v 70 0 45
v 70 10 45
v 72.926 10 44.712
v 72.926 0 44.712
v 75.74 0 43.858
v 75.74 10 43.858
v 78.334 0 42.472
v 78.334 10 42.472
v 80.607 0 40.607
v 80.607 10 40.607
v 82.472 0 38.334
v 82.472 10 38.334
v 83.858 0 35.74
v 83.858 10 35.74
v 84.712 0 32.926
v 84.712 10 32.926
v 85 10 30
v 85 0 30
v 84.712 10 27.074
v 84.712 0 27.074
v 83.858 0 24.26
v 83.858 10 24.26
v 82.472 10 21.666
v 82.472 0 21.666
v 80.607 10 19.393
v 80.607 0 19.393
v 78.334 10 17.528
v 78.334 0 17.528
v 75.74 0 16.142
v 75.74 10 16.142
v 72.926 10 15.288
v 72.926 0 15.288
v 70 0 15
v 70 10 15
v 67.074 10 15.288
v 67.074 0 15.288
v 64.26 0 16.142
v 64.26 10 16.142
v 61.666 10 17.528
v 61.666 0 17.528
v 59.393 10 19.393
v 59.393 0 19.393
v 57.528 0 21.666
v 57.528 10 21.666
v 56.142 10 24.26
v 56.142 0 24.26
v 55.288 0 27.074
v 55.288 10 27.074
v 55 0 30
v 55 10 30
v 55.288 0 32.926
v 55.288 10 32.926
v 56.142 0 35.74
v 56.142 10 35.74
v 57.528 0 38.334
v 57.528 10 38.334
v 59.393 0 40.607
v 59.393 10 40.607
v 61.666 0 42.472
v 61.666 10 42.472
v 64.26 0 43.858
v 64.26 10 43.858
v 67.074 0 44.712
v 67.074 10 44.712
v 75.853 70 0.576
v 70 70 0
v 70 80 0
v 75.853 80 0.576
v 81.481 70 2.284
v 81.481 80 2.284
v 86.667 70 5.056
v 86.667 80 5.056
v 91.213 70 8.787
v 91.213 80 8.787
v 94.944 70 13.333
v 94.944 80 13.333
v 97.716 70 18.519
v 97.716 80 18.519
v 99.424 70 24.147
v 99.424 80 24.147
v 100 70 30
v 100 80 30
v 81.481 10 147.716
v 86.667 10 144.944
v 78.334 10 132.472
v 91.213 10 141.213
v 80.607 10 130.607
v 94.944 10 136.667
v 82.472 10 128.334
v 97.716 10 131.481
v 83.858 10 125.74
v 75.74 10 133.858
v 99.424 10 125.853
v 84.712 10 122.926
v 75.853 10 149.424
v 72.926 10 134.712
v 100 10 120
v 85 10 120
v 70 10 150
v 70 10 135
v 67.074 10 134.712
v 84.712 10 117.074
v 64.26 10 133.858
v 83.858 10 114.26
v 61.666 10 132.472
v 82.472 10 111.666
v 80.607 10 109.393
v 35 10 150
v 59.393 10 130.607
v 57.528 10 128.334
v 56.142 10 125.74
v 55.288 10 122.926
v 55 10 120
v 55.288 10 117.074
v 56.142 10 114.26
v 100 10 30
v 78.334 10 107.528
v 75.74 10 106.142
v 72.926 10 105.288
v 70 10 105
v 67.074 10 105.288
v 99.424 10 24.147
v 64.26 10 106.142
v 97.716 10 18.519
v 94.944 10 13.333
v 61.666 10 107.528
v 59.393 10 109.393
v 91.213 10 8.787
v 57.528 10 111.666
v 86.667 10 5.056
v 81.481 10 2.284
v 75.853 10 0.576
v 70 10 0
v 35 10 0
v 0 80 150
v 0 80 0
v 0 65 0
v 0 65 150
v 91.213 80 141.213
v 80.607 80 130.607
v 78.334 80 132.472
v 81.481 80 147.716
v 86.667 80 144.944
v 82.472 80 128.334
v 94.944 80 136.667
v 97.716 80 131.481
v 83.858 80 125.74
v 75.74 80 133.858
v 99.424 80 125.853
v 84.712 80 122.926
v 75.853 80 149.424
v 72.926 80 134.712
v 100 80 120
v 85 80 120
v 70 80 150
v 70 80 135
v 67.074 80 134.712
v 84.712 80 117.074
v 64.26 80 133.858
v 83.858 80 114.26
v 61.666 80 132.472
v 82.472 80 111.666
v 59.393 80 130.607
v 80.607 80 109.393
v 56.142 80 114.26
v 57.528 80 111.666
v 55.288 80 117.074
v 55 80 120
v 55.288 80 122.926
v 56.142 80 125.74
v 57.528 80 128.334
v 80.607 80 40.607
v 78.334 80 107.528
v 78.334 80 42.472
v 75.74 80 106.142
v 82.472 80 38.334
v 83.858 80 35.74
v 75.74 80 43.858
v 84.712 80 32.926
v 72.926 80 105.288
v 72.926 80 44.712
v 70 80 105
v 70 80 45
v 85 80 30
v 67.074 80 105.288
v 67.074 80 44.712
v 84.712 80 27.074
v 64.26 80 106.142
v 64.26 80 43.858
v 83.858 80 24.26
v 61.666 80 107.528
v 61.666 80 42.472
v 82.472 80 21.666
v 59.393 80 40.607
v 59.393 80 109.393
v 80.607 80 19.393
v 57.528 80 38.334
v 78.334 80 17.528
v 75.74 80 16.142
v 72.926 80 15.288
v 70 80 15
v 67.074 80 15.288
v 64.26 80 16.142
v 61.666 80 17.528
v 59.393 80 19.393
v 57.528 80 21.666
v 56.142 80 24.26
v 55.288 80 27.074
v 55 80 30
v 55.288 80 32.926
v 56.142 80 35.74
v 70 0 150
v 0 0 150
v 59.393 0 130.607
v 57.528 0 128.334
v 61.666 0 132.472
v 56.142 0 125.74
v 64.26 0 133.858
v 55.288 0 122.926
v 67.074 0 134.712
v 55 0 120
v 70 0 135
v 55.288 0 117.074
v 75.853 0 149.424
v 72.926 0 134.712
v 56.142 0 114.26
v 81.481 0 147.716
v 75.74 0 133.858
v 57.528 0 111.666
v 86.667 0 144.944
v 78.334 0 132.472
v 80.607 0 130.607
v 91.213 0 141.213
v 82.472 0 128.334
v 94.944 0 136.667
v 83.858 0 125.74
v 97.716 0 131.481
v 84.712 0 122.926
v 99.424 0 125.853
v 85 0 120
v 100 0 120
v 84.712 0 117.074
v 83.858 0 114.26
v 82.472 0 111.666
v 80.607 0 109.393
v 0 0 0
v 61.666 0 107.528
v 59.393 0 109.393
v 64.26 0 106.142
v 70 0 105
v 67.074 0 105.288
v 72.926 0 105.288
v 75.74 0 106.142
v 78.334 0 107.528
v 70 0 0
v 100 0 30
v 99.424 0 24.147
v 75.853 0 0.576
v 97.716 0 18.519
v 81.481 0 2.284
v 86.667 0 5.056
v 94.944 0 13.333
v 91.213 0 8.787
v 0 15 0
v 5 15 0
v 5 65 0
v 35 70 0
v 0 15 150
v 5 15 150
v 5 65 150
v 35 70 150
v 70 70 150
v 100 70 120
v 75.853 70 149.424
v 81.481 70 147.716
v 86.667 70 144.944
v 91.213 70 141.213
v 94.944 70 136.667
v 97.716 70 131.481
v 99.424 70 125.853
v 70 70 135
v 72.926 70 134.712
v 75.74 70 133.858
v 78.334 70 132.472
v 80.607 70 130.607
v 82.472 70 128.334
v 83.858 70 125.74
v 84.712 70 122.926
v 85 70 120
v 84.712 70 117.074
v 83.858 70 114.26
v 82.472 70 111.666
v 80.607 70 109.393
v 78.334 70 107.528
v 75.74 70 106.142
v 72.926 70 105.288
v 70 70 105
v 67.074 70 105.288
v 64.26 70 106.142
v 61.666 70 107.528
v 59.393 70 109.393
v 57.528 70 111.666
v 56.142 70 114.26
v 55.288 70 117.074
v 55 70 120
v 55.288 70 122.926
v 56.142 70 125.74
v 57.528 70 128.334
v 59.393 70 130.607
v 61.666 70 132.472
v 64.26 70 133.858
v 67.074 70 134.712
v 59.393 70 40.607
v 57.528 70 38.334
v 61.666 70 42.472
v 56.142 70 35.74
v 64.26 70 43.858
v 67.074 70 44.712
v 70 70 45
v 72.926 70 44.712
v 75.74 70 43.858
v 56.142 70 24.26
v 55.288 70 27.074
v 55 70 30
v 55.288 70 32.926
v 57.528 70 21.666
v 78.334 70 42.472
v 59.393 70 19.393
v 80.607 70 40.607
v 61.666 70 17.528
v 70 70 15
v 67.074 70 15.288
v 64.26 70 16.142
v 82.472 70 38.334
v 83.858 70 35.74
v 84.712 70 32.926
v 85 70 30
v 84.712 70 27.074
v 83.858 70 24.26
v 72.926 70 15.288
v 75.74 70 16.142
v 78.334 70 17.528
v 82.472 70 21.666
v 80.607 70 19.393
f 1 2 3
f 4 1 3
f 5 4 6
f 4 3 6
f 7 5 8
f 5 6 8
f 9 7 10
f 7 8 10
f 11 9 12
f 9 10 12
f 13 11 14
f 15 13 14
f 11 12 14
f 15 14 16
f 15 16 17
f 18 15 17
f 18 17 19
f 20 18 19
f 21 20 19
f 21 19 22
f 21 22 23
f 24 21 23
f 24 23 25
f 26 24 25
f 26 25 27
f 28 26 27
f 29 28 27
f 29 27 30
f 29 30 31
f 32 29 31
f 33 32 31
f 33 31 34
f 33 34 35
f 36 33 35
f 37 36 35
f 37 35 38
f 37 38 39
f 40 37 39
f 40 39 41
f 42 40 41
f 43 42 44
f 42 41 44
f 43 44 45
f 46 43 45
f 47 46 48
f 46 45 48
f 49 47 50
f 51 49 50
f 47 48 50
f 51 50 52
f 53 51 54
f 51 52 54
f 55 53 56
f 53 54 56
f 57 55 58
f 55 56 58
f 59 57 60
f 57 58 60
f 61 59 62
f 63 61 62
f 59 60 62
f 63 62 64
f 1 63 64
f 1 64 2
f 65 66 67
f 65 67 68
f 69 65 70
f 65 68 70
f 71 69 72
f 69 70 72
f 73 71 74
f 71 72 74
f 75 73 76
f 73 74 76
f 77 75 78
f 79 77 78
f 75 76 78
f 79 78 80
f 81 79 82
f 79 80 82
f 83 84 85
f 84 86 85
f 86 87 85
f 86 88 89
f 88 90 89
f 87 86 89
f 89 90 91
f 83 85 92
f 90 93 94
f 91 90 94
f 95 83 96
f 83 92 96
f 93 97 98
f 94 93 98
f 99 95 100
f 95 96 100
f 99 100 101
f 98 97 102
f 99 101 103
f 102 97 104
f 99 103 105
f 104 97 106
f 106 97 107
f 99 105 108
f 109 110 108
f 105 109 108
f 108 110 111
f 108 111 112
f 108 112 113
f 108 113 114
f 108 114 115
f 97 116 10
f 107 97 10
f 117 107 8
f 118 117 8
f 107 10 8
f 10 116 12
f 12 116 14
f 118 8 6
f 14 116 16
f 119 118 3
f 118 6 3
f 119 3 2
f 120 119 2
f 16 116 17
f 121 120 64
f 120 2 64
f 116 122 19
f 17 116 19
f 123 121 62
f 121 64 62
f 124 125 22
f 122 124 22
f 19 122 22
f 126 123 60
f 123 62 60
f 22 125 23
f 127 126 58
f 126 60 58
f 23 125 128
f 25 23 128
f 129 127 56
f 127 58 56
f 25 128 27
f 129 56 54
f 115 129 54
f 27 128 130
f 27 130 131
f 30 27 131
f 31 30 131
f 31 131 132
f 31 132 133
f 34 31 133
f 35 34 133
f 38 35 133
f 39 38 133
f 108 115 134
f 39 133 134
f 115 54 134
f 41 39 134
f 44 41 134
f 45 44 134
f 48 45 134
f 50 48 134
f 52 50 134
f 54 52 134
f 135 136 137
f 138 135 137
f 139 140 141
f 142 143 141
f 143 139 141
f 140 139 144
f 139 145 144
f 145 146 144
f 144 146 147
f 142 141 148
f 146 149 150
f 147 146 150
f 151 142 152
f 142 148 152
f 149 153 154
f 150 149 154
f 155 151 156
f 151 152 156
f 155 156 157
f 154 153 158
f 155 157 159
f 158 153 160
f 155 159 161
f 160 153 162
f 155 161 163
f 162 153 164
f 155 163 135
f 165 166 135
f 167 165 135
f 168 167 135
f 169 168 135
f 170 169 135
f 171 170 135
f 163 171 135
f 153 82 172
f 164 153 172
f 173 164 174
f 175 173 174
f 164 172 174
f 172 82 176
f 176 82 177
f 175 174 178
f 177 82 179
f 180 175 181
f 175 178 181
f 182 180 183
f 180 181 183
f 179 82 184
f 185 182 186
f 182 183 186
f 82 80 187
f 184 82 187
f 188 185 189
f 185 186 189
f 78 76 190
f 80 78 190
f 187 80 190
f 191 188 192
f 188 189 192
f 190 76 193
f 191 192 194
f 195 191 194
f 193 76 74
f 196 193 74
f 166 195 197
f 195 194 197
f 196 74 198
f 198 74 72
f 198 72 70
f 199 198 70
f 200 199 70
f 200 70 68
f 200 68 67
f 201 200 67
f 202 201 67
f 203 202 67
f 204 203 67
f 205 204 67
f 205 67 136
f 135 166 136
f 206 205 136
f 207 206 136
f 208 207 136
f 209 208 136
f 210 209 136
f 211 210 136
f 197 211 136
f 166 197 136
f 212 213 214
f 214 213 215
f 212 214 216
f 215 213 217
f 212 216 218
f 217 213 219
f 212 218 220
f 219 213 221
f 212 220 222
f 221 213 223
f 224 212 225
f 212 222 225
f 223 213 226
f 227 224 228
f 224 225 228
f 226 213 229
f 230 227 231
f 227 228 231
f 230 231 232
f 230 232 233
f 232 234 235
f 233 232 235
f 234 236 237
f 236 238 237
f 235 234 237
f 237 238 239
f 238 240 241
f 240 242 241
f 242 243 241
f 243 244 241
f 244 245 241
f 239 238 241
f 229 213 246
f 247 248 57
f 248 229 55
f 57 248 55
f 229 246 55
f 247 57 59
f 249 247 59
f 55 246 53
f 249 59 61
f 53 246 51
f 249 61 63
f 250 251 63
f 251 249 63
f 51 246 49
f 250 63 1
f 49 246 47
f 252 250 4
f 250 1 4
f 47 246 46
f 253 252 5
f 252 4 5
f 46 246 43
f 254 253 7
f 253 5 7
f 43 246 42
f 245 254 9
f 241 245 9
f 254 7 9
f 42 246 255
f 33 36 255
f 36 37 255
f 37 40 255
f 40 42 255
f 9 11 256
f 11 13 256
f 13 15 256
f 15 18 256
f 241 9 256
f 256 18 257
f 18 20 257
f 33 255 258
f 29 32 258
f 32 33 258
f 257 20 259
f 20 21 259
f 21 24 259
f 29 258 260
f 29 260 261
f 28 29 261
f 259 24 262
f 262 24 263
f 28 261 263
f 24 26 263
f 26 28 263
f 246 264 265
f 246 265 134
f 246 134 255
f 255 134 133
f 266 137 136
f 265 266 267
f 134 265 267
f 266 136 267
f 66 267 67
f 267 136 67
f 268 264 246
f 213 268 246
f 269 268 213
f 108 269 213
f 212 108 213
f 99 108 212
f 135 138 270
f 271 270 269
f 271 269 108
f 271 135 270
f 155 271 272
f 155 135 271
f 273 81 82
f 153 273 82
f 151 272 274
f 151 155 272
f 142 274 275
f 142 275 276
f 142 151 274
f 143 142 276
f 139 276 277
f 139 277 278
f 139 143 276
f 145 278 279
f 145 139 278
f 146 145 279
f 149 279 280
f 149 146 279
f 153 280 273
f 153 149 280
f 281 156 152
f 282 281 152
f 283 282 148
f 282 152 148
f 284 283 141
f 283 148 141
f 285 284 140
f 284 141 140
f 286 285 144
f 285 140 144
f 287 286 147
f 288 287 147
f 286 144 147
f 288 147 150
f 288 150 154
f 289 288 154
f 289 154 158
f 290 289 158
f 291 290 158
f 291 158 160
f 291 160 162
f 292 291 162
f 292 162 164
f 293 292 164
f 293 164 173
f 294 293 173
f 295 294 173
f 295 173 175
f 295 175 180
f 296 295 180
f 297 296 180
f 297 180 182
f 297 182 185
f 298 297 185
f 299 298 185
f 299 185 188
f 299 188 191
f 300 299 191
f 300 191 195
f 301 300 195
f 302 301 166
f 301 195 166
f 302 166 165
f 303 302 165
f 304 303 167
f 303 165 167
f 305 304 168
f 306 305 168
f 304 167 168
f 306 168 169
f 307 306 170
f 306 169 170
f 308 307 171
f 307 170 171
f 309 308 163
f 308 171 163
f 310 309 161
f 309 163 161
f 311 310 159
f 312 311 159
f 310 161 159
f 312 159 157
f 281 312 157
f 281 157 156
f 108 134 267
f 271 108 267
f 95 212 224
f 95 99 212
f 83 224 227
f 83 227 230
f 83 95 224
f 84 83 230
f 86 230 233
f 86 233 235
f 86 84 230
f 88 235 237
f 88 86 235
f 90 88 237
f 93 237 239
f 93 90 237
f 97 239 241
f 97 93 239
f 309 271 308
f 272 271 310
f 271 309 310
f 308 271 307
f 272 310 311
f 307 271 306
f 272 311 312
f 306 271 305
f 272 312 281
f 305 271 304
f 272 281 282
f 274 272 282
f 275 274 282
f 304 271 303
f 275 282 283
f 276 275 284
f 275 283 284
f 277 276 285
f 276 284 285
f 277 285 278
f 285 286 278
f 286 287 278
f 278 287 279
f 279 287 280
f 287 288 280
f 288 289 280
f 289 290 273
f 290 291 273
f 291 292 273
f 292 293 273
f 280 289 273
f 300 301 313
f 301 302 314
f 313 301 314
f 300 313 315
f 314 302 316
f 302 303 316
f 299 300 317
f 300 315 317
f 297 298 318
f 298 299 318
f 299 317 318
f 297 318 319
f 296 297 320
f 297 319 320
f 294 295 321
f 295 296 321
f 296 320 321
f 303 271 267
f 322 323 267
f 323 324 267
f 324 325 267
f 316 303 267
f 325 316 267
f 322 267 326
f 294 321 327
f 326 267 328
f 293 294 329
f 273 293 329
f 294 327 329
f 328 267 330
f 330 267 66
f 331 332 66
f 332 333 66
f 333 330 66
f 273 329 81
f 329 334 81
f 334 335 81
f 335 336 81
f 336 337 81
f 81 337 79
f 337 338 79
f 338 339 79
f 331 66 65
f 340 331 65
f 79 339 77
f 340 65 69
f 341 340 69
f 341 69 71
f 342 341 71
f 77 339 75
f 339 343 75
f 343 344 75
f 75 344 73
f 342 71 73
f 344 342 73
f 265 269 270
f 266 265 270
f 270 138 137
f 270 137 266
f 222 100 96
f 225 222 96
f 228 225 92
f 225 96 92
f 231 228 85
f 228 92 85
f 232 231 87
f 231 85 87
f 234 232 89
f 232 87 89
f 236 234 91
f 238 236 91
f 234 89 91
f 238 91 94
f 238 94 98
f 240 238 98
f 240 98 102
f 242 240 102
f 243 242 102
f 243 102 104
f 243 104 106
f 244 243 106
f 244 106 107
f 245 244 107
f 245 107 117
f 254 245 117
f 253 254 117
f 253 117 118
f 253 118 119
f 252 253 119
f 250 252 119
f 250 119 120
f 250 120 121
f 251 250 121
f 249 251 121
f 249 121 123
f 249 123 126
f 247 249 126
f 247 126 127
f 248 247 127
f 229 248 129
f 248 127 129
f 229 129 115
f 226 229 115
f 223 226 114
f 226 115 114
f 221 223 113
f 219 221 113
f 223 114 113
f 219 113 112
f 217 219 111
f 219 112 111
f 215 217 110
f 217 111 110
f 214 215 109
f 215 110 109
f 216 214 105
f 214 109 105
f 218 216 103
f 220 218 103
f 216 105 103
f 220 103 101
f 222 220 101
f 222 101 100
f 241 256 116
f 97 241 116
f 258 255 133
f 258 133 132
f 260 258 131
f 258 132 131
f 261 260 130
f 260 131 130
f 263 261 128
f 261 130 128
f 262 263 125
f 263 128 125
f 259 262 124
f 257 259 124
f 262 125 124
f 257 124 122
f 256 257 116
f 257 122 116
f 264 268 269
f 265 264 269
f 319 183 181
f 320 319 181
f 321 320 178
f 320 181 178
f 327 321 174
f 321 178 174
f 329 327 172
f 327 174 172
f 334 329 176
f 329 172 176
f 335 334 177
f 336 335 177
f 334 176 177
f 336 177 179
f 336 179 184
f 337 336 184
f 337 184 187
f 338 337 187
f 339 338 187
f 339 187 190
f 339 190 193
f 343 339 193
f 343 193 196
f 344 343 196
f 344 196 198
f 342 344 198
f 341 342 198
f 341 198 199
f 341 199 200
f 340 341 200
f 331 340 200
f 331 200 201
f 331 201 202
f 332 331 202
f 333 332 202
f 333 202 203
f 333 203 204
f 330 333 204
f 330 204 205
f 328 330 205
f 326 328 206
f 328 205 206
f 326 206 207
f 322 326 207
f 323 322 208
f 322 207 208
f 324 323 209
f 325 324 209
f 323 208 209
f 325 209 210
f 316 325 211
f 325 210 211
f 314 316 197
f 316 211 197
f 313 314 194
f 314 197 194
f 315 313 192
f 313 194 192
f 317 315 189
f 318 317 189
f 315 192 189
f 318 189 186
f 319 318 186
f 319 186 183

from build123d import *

# Parameters (mm, degrees)
BOSS_EXTRUDE1_DEPTH = 150
SKETCH2_W           = 5
SKETCH2_H           = 50
CUT_EXTRUDE1_DEPTH  = 150
SKETCH3_R           = 15
CUT_EXTRUDE2_DEPTH  = 150
FILLET1_R           = 30


with BuildPart() as part:
    # Sketch1 → Boss-Extrude1 (new body)
    with BuildSketch(Plane.XY):
        Polygon((0, 0), (35, 0), (100, 0), (100, 10), (35, 10), (35, 70), (100, 70), (100, 80), (35, 80), (0, 80), align=None)
    extrude(amount=BOSS_EXTRUDE1_DEPTH)

    # Sketch2 → Cut-Extrude1 (cut)
    with BuildSketch(Plane.XY.offset(150)):
        with Locations((2.5, 40)):
            Rectangle(SKETCH2_W, SKETCH2_H)
    extrude(amount=-CUT_EXTRUDE1_DEPTH, mode=Mode.SUBTRACT)

    # Sketch3 → Cut-Extrude2 (cut)
    with BuildSketch(Plane(origin=(0, 80, 0), x_dir=(1, 0, 0), z_dir=(0, 1, 0))):
        with Locations(Location((70, -30, 0), (0, 0, 270))):
            Circle(SKETCH3_R)
        with Locations(Location((70, -120, 0), (0, 0, 270))):
            Circle(SKETCH3_R)
    extrude(amount=-CUT_EXTRUDE2_DEPTH, mode=Mode.SUBTRACT)

    # Fillet1
    fillet1_edges = [part.edges().sort_by_distance(p)[0] for p in [
        (100, 75, 0),
        (100, 5, 0),
        (100, 5, 150),
        (100, 75, 150),
    ]]
    fillet(fillet1_edges, radius=FILLET1_R)


solid = part.part
